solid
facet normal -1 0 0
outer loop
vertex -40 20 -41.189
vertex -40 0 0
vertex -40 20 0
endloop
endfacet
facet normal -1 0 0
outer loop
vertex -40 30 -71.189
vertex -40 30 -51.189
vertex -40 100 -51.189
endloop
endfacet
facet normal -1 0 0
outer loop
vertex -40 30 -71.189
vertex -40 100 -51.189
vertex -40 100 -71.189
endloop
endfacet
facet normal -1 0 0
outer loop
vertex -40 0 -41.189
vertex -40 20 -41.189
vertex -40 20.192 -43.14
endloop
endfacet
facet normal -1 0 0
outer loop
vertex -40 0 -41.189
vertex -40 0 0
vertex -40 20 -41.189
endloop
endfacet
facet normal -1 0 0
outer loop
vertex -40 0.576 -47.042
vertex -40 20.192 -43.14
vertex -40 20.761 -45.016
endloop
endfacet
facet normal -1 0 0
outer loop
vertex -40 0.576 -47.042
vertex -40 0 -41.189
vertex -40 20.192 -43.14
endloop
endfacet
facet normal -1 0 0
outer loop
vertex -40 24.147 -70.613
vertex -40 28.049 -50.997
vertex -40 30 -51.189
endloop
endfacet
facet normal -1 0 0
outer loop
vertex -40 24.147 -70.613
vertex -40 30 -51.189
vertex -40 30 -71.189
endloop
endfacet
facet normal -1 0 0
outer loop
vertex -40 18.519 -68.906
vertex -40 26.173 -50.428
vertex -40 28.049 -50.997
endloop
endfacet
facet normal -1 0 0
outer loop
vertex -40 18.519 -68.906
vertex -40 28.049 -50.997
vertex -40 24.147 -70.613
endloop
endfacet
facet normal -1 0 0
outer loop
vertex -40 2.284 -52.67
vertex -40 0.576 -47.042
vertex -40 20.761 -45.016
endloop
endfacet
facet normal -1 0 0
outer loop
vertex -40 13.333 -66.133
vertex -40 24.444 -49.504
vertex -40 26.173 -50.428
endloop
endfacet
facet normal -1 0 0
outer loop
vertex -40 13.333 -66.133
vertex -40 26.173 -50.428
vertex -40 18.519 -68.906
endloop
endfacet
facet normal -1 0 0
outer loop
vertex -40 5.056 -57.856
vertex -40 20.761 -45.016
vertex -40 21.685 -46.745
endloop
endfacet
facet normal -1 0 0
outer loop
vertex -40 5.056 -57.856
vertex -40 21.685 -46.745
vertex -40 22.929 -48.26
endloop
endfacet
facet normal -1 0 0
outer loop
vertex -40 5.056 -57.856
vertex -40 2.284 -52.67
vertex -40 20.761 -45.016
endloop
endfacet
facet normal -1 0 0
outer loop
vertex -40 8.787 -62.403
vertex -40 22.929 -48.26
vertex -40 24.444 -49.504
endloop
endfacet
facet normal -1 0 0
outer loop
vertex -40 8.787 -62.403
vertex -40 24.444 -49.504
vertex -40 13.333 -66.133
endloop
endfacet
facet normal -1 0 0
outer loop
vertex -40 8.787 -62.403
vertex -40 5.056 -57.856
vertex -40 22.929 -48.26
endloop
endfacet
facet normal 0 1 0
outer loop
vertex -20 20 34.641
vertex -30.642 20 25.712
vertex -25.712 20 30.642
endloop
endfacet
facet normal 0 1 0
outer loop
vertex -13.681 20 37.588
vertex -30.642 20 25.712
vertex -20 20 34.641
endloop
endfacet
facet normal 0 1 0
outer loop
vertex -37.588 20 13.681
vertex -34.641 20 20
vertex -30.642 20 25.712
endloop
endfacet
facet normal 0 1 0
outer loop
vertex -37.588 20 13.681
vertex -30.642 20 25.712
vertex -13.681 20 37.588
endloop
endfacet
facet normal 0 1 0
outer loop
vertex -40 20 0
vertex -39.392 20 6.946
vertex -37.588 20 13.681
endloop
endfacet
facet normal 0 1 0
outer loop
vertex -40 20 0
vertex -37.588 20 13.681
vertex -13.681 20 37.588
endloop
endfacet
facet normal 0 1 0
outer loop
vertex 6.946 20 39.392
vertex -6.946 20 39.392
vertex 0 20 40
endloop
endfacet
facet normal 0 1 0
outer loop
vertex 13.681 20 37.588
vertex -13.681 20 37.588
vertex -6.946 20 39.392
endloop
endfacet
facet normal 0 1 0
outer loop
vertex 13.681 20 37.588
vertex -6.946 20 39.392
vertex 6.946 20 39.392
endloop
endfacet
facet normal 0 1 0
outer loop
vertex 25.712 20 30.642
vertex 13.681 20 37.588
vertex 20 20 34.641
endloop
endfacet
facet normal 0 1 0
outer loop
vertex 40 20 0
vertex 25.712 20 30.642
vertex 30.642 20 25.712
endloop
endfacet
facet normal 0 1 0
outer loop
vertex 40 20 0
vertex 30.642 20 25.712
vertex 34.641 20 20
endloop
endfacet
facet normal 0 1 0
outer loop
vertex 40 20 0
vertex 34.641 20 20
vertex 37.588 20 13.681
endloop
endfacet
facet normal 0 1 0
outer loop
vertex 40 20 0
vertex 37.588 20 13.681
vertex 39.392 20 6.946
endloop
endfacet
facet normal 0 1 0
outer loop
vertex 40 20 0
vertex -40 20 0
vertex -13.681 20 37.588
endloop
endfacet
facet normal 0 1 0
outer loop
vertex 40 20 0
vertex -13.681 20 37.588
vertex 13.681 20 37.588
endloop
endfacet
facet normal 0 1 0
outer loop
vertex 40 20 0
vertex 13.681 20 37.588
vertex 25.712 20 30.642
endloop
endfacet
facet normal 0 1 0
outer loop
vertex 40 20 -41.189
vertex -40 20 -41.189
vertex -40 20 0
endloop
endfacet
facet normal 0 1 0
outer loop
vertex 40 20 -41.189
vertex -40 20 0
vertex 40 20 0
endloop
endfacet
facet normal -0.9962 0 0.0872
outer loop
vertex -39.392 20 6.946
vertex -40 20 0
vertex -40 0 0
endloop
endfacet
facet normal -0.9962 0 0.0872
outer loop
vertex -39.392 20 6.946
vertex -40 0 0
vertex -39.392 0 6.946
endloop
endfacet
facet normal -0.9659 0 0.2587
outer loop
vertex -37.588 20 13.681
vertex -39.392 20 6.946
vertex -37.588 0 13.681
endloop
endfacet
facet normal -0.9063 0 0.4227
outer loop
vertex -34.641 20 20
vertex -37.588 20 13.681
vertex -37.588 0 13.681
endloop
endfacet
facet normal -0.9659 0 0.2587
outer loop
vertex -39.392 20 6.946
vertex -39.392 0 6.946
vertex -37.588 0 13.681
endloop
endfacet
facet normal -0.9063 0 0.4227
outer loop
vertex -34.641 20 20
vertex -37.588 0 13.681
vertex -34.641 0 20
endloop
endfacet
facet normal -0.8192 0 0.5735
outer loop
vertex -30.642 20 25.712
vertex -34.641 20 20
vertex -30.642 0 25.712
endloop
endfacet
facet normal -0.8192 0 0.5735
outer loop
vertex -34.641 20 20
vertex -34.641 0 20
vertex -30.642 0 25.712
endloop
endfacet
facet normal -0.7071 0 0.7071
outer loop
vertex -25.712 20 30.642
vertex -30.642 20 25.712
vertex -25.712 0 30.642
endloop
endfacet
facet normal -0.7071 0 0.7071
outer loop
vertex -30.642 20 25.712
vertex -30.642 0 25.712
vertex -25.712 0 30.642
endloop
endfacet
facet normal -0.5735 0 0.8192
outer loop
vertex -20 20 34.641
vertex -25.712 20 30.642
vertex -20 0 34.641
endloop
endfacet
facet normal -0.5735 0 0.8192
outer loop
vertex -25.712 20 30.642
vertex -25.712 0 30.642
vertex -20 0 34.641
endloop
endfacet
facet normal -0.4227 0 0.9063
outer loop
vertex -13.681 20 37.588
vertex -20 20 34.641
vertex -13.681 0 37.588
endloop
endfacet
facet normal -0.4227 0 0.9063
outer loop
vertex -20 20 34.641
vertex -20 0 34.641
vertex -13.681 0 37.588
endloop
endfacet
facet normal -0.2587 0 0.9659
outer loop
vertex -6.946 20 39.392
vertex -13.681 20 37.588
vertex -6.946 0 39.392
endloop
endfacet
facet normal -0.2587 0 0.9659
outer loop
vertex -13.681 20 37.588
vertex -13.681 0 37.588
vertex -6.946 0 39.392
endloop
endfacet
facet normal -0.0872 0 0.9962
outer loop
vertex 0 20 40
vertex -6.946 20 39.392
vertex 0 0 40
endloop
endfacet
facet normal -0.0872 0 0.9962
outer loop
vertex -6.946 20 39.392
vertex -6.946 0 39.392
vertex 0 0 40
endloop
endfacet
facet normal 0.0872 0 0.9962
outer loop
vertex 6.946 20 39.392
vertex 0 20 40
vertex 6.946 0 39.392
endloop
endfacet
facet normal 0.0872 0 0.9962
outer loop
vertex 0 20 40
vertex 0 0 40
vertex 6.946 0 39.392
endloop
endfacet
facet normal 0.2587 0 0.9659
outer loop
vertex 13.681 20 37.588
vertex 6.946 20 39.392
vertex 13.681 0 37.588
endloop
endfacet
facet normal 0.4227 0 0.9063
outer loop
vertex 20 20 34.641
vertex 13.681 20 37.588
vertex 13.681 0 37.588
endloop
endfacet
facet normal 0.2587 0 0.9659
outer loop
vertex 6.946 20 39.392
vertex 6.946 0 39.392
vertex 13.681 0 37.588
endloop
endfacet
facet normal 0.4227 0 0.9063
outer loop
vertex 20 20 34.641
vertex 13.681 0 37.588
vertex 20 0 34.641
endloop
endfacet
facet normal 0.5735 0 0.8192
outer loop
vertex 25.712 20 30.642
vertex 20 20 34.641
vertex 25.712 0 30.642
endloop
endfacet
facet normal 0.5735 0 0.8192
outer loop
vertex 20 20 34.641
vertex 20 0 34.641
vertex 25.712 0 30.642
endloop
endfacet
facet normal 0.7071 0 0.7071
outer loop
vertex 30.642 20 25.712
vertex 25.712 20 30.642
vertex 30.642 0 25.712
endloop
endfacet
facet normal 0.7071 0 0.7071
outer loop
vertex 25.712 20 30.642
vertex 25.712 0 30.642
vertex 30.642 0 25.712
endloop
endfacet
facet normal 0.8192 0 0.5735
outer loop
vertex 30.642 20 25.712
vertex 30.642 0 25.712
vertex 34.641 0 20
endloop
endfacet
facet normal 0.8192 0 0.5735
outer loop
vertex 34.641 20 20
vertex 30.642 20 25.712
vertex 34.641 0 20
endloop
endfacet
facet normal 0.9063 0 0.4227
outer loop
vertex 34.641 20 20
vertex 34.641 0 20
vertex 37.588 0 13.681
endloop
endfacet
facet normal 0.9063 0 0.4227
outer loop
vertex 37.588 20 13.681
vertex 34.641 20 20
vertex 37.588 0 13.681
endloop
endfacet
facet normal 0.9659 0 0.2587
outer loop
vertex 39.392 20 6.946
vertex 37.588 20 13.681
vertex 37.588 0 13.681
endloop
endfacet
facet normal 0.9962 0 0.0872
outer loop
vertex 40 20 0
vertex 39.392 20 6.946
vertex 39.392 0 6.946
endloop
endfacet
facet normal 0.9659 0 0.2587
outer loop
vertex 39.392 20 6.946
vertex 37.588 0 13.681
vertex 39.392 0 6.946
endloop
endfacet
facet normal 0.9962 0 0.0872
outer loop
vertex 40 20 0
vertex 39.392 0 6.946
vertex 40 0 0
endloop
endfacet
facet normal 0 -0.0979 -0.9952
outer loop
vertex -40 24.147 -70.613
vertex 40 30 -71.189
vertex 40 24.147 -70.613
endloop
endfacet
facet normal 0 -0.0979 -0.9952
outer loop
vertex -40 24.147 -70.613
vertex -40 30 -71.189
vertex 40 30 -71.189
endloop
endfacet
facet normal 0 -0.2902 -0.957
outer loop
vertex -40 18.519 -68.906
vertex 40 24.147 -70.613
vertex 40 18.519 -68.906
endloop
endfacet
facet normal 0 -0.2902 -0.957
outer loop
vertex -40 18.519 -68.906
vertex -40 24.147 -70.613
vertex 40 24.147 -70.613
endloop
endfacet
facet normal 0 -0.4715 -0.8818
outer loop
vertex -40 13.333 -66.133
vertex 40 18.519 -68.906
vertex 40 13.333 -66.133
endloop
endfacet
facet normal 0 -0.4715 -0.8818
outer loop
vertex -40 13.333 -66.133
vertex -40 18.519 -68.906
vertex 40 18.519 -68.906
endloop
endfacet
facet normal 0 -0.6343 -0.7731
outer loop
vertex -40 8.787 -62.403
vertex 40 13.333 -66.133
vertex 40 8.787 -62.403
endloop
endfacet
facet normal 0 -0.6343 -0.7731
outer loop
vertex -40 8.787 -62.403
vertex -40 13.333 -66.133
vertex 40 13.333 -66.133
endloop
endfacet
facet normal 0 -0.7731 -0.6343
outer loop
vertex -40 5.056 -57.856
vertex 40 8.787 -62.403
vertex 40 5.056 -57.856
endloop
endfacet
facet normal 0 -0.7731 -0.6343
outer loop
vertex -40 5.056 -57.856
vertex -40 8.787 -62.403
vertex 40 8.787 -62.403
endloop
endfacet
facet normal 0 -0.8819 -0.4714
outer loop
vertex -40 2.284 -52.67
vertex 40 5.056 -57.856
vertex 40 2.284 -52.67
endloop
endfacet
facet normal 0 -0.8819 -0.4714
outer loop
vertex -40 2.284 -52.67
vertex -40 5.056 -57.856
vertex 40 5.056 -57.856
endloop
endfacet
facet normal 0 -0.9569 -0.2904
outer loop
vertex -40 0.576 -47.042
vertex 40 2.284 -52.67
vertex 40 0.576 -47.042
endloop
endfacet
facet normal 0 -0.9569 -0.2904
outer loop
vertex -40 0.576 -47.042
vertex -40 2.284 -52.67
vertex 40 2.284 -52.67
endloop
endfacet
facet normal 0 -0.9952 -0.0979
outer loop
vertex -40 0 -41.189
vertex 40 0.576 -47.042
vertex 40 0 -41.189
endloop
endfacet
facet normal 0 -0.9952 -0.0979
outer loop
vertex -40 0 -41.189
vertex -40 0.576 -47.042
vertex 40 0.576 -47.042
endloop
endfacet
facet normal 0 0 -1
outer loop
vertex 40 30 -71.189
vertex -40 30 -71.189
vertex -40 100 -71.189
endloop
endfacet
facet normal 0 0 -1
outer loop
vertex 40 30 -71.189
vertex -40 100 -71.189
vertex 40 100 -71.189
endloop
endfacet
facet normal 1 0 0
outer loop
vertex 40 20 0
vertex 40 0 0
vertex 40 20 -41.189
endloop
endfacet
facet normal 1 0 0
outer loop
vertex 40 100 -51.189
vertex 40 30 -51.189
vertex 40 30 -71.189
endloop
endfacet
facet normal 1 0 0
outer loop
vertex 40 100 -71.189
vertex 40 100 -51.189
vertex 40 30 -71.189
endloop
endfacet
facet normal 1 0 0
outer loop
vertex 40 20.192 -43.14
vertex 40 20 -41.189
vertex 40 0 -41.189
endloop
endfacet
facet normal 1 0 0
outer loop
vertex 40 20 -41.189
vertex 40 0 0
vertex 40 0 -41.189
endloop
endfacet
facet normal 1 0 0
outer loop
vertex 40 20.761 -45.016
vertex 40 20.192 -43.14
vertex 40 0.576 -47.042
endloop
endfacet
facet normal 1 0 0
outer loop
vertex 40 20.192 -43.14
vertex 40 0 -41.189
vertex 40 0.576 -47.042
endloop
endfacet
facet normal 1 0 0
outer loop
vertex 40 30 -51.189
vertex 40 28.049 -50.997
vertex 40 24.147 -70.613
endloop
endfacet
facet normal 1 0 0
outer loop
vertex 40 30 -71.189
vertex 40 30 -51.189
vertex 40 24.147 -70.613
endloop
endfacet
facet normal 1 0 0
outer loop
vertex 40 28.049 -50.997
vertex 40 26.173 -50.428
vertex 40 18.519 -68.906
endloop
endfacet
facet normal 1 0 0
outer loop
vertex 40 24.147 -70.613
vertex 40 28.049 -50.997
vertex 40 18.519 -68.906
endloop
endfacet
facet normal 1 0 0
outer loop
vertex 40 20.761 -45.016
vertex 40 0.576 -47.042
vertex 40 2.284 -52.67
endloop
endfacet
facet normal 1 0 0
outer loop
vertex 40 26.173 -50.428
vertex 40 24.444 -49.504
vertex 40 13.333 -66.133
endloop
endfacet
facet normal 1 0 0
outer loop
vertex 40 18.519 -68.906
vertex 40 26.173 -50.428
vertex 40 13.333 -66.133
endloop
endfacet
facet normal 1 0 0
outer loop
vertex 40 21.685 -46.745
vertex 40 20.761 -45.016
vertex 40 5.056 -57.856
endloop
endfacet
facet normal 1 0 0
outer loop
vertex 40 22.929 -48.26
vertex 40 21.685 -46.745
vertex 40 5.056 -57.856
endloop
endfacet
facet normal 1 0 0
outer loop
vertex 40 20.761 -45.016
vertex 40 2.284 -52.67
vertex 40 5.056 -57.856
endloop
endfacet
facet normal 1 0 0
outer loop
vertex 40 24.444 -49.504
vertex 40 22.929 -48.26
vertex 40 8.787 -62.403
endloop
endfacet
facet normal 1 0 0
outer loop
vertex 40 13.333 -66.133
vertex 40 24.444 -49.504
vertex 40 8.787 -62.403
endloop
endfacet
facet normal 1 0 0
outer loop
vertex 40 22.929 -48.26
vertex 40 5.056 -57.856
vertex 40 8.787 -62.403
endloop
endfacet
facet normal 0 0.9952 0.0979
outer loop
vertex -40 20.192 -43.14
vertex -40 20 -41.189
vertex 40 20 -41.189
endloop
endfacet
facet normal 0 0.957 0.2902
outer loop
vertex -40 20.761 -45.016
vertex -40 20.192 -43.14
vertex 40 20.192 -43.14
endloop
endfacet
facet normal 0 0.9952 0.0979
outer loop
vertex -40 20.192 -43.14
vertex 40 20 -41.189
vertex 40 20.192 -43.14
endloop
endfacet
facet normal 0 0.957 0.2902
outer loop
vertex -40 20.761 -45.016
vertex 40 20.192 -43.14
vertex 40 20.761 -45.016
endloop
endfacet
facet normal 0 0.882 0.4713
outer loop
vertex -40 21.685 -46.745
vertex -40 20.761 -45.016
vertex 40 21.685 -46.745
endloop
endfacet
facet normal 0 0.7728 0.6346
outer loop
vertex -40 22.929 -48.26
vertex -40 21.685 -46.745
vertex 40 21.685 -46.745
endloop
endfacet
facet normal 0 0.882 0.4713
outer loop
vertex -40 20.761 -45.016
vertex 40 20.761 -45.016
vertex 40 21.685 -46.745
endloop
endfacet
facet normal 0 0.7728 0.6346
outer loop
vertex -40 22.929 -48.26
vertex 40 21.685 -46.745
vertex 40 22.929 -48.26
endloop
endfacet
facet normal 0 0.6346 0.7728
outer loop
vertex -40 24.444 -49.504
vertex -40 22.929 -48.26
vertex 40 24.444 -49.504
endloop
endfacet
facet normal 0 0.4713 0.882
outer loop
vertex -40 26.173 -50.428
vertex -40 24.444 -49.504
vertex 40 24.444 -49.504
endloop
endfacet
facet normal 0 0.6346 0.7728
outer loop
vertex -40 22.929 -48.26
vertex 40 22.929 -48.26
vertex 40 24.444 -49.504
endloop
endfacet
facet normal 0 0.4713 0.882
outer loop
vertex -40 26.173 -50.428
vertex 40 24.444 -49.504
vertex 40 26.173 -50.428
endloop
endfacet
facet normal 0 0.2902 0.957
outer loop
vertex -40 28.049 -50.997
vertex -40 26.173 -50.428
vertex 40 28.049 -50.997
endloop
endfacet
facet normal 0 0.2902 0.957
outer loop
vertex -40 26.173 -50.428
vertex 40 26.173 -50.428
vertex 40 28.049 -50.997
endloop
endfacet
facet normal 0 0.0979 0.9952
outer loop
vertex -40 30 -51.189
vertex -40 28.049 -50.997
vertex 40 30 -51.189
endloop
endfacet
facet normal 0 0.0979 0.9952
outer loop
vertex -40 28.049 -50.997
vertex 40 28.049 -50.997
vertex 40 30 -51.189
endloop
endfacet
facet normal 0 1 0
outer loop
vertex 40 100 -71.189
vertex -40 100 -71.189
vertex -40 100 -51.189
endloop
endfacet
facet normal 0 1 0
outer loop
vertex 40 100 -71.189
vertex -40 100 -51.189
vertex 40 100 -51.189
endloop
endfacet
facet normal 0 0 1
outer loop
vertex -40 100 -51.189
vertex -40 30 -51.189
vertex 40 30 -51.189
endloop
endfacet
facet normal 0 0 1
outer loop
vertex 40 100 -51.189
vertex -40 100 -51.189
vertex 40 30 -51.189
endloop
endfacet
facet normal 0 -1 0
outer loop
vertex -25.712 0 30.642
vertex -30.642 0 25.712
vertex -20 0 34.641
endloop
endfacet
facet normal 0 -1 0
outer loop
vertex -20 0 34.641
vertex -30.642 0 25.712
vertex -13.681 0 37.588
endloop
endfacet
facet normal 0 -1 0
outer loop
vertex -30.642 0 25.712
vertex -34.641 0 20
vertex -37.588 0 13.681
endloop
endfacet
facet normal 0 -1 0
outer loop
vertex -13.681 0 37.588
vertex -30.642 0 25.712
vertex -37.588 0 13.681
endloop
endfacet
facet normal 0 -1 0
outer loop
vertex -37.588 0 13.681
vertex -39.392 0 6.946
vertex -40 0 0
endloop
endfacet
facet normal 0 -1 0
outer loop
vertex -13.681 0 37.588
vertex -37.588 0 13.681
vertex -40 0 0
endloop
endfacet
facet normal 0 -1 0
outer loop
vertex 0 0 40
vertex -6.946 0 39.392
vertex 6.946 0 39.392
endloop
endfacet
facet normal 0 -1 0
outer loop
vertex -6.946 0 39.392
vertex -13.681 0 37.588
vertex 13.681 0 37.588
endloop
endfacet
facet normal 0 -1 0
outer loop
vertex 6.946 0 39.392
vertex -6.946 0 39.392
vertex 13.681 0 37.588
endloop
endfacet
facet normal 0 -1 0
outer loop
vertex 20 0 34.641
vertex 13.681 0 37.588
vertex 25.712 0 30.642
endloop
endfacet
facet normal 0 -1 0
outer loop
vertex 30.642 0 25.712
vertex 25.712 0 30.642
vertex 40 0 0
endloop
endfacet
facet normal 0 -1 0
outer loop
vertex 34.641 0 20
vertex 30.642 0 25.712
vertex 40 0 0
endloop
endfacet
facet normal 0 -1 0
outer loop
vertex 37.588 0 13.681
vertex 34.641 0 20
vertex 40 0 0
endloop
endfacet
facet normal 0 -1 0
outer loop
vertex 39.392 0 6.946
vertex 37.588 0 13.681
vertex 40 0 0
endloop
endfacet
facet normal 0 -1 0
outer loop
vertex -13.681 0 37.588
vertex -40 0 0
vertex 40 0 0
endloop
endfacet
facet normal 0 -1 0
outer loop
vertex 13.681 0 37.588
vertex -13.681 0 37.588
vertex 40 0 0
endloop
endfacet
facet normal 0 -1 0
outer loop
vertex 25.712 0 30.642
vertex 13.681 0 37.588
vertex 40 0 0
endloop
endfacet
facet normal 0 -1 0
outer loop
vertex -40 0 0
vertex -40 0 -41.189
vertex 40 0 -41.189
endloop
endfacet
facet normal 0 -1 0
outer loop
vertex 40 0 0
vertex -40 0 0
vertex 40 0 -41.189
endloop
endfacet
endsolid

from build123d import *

# Parameters (mm, degrees)
SKETCH_3_R      = 40
EXTRUDE_1_DEPTH = 20
SKETCH_4_W      = 80
SKETCH_4_H      = 20
EXTRUDE_2_DEPTH = 80
FILLET_2_R      = 10
FILLET_3_R      = 30


with BuildPart() as part:
    # 草图3 → 凸台-拉伸1 (new body)
    with BuildSketch(Plane(origin=(0, 0, 0), x_dir=(1, 0, 0), z_dir=(0, 1, 0))):
        with BuildLine():
            Line((-40, 71.189389762), (-40, 0))
            ThreePointArc((-40, 0), (0, 40), (40, 0))
            Line((40, 0), (40, 71.189389762))
            Line((40, 71.189389762), (-40, 71.189389762))
        make_face()
        Circle(SKETCH_3_R)
    extrude(amount=EXTRUDE_1_DEPTH)

    # 草图4 → 凸台-拉伸2 (add)
    with BuildSketch(Plane(origin=(0, 20, 0), x_dir=(1, 0, 0), z_dir=(0, 1, 0))):
        with Locations((0, 61.189389762)):
            Rectangle(SKETCH_4_W, SKETCH_4_H)
    extrude(amount=EXTRUDE_2_DEPTH)

    # 圆角2
    fillet_2_edges = [part.edges().sort_by_distance(p)[0] for p in [
        (0, 20, -51.189389762),
    ]]
    fillet(fillet_2_edges, radius=FILLET_2_R)

    # 圆角3
    fillet_3_edges = [part.edges().sort_by_distance(p)[0] for p in [
        (0, 0, -71.189389762),
    ]]
    fillet(fillet_3_edges, radius=FILLET_3_R)


solid = part.part
